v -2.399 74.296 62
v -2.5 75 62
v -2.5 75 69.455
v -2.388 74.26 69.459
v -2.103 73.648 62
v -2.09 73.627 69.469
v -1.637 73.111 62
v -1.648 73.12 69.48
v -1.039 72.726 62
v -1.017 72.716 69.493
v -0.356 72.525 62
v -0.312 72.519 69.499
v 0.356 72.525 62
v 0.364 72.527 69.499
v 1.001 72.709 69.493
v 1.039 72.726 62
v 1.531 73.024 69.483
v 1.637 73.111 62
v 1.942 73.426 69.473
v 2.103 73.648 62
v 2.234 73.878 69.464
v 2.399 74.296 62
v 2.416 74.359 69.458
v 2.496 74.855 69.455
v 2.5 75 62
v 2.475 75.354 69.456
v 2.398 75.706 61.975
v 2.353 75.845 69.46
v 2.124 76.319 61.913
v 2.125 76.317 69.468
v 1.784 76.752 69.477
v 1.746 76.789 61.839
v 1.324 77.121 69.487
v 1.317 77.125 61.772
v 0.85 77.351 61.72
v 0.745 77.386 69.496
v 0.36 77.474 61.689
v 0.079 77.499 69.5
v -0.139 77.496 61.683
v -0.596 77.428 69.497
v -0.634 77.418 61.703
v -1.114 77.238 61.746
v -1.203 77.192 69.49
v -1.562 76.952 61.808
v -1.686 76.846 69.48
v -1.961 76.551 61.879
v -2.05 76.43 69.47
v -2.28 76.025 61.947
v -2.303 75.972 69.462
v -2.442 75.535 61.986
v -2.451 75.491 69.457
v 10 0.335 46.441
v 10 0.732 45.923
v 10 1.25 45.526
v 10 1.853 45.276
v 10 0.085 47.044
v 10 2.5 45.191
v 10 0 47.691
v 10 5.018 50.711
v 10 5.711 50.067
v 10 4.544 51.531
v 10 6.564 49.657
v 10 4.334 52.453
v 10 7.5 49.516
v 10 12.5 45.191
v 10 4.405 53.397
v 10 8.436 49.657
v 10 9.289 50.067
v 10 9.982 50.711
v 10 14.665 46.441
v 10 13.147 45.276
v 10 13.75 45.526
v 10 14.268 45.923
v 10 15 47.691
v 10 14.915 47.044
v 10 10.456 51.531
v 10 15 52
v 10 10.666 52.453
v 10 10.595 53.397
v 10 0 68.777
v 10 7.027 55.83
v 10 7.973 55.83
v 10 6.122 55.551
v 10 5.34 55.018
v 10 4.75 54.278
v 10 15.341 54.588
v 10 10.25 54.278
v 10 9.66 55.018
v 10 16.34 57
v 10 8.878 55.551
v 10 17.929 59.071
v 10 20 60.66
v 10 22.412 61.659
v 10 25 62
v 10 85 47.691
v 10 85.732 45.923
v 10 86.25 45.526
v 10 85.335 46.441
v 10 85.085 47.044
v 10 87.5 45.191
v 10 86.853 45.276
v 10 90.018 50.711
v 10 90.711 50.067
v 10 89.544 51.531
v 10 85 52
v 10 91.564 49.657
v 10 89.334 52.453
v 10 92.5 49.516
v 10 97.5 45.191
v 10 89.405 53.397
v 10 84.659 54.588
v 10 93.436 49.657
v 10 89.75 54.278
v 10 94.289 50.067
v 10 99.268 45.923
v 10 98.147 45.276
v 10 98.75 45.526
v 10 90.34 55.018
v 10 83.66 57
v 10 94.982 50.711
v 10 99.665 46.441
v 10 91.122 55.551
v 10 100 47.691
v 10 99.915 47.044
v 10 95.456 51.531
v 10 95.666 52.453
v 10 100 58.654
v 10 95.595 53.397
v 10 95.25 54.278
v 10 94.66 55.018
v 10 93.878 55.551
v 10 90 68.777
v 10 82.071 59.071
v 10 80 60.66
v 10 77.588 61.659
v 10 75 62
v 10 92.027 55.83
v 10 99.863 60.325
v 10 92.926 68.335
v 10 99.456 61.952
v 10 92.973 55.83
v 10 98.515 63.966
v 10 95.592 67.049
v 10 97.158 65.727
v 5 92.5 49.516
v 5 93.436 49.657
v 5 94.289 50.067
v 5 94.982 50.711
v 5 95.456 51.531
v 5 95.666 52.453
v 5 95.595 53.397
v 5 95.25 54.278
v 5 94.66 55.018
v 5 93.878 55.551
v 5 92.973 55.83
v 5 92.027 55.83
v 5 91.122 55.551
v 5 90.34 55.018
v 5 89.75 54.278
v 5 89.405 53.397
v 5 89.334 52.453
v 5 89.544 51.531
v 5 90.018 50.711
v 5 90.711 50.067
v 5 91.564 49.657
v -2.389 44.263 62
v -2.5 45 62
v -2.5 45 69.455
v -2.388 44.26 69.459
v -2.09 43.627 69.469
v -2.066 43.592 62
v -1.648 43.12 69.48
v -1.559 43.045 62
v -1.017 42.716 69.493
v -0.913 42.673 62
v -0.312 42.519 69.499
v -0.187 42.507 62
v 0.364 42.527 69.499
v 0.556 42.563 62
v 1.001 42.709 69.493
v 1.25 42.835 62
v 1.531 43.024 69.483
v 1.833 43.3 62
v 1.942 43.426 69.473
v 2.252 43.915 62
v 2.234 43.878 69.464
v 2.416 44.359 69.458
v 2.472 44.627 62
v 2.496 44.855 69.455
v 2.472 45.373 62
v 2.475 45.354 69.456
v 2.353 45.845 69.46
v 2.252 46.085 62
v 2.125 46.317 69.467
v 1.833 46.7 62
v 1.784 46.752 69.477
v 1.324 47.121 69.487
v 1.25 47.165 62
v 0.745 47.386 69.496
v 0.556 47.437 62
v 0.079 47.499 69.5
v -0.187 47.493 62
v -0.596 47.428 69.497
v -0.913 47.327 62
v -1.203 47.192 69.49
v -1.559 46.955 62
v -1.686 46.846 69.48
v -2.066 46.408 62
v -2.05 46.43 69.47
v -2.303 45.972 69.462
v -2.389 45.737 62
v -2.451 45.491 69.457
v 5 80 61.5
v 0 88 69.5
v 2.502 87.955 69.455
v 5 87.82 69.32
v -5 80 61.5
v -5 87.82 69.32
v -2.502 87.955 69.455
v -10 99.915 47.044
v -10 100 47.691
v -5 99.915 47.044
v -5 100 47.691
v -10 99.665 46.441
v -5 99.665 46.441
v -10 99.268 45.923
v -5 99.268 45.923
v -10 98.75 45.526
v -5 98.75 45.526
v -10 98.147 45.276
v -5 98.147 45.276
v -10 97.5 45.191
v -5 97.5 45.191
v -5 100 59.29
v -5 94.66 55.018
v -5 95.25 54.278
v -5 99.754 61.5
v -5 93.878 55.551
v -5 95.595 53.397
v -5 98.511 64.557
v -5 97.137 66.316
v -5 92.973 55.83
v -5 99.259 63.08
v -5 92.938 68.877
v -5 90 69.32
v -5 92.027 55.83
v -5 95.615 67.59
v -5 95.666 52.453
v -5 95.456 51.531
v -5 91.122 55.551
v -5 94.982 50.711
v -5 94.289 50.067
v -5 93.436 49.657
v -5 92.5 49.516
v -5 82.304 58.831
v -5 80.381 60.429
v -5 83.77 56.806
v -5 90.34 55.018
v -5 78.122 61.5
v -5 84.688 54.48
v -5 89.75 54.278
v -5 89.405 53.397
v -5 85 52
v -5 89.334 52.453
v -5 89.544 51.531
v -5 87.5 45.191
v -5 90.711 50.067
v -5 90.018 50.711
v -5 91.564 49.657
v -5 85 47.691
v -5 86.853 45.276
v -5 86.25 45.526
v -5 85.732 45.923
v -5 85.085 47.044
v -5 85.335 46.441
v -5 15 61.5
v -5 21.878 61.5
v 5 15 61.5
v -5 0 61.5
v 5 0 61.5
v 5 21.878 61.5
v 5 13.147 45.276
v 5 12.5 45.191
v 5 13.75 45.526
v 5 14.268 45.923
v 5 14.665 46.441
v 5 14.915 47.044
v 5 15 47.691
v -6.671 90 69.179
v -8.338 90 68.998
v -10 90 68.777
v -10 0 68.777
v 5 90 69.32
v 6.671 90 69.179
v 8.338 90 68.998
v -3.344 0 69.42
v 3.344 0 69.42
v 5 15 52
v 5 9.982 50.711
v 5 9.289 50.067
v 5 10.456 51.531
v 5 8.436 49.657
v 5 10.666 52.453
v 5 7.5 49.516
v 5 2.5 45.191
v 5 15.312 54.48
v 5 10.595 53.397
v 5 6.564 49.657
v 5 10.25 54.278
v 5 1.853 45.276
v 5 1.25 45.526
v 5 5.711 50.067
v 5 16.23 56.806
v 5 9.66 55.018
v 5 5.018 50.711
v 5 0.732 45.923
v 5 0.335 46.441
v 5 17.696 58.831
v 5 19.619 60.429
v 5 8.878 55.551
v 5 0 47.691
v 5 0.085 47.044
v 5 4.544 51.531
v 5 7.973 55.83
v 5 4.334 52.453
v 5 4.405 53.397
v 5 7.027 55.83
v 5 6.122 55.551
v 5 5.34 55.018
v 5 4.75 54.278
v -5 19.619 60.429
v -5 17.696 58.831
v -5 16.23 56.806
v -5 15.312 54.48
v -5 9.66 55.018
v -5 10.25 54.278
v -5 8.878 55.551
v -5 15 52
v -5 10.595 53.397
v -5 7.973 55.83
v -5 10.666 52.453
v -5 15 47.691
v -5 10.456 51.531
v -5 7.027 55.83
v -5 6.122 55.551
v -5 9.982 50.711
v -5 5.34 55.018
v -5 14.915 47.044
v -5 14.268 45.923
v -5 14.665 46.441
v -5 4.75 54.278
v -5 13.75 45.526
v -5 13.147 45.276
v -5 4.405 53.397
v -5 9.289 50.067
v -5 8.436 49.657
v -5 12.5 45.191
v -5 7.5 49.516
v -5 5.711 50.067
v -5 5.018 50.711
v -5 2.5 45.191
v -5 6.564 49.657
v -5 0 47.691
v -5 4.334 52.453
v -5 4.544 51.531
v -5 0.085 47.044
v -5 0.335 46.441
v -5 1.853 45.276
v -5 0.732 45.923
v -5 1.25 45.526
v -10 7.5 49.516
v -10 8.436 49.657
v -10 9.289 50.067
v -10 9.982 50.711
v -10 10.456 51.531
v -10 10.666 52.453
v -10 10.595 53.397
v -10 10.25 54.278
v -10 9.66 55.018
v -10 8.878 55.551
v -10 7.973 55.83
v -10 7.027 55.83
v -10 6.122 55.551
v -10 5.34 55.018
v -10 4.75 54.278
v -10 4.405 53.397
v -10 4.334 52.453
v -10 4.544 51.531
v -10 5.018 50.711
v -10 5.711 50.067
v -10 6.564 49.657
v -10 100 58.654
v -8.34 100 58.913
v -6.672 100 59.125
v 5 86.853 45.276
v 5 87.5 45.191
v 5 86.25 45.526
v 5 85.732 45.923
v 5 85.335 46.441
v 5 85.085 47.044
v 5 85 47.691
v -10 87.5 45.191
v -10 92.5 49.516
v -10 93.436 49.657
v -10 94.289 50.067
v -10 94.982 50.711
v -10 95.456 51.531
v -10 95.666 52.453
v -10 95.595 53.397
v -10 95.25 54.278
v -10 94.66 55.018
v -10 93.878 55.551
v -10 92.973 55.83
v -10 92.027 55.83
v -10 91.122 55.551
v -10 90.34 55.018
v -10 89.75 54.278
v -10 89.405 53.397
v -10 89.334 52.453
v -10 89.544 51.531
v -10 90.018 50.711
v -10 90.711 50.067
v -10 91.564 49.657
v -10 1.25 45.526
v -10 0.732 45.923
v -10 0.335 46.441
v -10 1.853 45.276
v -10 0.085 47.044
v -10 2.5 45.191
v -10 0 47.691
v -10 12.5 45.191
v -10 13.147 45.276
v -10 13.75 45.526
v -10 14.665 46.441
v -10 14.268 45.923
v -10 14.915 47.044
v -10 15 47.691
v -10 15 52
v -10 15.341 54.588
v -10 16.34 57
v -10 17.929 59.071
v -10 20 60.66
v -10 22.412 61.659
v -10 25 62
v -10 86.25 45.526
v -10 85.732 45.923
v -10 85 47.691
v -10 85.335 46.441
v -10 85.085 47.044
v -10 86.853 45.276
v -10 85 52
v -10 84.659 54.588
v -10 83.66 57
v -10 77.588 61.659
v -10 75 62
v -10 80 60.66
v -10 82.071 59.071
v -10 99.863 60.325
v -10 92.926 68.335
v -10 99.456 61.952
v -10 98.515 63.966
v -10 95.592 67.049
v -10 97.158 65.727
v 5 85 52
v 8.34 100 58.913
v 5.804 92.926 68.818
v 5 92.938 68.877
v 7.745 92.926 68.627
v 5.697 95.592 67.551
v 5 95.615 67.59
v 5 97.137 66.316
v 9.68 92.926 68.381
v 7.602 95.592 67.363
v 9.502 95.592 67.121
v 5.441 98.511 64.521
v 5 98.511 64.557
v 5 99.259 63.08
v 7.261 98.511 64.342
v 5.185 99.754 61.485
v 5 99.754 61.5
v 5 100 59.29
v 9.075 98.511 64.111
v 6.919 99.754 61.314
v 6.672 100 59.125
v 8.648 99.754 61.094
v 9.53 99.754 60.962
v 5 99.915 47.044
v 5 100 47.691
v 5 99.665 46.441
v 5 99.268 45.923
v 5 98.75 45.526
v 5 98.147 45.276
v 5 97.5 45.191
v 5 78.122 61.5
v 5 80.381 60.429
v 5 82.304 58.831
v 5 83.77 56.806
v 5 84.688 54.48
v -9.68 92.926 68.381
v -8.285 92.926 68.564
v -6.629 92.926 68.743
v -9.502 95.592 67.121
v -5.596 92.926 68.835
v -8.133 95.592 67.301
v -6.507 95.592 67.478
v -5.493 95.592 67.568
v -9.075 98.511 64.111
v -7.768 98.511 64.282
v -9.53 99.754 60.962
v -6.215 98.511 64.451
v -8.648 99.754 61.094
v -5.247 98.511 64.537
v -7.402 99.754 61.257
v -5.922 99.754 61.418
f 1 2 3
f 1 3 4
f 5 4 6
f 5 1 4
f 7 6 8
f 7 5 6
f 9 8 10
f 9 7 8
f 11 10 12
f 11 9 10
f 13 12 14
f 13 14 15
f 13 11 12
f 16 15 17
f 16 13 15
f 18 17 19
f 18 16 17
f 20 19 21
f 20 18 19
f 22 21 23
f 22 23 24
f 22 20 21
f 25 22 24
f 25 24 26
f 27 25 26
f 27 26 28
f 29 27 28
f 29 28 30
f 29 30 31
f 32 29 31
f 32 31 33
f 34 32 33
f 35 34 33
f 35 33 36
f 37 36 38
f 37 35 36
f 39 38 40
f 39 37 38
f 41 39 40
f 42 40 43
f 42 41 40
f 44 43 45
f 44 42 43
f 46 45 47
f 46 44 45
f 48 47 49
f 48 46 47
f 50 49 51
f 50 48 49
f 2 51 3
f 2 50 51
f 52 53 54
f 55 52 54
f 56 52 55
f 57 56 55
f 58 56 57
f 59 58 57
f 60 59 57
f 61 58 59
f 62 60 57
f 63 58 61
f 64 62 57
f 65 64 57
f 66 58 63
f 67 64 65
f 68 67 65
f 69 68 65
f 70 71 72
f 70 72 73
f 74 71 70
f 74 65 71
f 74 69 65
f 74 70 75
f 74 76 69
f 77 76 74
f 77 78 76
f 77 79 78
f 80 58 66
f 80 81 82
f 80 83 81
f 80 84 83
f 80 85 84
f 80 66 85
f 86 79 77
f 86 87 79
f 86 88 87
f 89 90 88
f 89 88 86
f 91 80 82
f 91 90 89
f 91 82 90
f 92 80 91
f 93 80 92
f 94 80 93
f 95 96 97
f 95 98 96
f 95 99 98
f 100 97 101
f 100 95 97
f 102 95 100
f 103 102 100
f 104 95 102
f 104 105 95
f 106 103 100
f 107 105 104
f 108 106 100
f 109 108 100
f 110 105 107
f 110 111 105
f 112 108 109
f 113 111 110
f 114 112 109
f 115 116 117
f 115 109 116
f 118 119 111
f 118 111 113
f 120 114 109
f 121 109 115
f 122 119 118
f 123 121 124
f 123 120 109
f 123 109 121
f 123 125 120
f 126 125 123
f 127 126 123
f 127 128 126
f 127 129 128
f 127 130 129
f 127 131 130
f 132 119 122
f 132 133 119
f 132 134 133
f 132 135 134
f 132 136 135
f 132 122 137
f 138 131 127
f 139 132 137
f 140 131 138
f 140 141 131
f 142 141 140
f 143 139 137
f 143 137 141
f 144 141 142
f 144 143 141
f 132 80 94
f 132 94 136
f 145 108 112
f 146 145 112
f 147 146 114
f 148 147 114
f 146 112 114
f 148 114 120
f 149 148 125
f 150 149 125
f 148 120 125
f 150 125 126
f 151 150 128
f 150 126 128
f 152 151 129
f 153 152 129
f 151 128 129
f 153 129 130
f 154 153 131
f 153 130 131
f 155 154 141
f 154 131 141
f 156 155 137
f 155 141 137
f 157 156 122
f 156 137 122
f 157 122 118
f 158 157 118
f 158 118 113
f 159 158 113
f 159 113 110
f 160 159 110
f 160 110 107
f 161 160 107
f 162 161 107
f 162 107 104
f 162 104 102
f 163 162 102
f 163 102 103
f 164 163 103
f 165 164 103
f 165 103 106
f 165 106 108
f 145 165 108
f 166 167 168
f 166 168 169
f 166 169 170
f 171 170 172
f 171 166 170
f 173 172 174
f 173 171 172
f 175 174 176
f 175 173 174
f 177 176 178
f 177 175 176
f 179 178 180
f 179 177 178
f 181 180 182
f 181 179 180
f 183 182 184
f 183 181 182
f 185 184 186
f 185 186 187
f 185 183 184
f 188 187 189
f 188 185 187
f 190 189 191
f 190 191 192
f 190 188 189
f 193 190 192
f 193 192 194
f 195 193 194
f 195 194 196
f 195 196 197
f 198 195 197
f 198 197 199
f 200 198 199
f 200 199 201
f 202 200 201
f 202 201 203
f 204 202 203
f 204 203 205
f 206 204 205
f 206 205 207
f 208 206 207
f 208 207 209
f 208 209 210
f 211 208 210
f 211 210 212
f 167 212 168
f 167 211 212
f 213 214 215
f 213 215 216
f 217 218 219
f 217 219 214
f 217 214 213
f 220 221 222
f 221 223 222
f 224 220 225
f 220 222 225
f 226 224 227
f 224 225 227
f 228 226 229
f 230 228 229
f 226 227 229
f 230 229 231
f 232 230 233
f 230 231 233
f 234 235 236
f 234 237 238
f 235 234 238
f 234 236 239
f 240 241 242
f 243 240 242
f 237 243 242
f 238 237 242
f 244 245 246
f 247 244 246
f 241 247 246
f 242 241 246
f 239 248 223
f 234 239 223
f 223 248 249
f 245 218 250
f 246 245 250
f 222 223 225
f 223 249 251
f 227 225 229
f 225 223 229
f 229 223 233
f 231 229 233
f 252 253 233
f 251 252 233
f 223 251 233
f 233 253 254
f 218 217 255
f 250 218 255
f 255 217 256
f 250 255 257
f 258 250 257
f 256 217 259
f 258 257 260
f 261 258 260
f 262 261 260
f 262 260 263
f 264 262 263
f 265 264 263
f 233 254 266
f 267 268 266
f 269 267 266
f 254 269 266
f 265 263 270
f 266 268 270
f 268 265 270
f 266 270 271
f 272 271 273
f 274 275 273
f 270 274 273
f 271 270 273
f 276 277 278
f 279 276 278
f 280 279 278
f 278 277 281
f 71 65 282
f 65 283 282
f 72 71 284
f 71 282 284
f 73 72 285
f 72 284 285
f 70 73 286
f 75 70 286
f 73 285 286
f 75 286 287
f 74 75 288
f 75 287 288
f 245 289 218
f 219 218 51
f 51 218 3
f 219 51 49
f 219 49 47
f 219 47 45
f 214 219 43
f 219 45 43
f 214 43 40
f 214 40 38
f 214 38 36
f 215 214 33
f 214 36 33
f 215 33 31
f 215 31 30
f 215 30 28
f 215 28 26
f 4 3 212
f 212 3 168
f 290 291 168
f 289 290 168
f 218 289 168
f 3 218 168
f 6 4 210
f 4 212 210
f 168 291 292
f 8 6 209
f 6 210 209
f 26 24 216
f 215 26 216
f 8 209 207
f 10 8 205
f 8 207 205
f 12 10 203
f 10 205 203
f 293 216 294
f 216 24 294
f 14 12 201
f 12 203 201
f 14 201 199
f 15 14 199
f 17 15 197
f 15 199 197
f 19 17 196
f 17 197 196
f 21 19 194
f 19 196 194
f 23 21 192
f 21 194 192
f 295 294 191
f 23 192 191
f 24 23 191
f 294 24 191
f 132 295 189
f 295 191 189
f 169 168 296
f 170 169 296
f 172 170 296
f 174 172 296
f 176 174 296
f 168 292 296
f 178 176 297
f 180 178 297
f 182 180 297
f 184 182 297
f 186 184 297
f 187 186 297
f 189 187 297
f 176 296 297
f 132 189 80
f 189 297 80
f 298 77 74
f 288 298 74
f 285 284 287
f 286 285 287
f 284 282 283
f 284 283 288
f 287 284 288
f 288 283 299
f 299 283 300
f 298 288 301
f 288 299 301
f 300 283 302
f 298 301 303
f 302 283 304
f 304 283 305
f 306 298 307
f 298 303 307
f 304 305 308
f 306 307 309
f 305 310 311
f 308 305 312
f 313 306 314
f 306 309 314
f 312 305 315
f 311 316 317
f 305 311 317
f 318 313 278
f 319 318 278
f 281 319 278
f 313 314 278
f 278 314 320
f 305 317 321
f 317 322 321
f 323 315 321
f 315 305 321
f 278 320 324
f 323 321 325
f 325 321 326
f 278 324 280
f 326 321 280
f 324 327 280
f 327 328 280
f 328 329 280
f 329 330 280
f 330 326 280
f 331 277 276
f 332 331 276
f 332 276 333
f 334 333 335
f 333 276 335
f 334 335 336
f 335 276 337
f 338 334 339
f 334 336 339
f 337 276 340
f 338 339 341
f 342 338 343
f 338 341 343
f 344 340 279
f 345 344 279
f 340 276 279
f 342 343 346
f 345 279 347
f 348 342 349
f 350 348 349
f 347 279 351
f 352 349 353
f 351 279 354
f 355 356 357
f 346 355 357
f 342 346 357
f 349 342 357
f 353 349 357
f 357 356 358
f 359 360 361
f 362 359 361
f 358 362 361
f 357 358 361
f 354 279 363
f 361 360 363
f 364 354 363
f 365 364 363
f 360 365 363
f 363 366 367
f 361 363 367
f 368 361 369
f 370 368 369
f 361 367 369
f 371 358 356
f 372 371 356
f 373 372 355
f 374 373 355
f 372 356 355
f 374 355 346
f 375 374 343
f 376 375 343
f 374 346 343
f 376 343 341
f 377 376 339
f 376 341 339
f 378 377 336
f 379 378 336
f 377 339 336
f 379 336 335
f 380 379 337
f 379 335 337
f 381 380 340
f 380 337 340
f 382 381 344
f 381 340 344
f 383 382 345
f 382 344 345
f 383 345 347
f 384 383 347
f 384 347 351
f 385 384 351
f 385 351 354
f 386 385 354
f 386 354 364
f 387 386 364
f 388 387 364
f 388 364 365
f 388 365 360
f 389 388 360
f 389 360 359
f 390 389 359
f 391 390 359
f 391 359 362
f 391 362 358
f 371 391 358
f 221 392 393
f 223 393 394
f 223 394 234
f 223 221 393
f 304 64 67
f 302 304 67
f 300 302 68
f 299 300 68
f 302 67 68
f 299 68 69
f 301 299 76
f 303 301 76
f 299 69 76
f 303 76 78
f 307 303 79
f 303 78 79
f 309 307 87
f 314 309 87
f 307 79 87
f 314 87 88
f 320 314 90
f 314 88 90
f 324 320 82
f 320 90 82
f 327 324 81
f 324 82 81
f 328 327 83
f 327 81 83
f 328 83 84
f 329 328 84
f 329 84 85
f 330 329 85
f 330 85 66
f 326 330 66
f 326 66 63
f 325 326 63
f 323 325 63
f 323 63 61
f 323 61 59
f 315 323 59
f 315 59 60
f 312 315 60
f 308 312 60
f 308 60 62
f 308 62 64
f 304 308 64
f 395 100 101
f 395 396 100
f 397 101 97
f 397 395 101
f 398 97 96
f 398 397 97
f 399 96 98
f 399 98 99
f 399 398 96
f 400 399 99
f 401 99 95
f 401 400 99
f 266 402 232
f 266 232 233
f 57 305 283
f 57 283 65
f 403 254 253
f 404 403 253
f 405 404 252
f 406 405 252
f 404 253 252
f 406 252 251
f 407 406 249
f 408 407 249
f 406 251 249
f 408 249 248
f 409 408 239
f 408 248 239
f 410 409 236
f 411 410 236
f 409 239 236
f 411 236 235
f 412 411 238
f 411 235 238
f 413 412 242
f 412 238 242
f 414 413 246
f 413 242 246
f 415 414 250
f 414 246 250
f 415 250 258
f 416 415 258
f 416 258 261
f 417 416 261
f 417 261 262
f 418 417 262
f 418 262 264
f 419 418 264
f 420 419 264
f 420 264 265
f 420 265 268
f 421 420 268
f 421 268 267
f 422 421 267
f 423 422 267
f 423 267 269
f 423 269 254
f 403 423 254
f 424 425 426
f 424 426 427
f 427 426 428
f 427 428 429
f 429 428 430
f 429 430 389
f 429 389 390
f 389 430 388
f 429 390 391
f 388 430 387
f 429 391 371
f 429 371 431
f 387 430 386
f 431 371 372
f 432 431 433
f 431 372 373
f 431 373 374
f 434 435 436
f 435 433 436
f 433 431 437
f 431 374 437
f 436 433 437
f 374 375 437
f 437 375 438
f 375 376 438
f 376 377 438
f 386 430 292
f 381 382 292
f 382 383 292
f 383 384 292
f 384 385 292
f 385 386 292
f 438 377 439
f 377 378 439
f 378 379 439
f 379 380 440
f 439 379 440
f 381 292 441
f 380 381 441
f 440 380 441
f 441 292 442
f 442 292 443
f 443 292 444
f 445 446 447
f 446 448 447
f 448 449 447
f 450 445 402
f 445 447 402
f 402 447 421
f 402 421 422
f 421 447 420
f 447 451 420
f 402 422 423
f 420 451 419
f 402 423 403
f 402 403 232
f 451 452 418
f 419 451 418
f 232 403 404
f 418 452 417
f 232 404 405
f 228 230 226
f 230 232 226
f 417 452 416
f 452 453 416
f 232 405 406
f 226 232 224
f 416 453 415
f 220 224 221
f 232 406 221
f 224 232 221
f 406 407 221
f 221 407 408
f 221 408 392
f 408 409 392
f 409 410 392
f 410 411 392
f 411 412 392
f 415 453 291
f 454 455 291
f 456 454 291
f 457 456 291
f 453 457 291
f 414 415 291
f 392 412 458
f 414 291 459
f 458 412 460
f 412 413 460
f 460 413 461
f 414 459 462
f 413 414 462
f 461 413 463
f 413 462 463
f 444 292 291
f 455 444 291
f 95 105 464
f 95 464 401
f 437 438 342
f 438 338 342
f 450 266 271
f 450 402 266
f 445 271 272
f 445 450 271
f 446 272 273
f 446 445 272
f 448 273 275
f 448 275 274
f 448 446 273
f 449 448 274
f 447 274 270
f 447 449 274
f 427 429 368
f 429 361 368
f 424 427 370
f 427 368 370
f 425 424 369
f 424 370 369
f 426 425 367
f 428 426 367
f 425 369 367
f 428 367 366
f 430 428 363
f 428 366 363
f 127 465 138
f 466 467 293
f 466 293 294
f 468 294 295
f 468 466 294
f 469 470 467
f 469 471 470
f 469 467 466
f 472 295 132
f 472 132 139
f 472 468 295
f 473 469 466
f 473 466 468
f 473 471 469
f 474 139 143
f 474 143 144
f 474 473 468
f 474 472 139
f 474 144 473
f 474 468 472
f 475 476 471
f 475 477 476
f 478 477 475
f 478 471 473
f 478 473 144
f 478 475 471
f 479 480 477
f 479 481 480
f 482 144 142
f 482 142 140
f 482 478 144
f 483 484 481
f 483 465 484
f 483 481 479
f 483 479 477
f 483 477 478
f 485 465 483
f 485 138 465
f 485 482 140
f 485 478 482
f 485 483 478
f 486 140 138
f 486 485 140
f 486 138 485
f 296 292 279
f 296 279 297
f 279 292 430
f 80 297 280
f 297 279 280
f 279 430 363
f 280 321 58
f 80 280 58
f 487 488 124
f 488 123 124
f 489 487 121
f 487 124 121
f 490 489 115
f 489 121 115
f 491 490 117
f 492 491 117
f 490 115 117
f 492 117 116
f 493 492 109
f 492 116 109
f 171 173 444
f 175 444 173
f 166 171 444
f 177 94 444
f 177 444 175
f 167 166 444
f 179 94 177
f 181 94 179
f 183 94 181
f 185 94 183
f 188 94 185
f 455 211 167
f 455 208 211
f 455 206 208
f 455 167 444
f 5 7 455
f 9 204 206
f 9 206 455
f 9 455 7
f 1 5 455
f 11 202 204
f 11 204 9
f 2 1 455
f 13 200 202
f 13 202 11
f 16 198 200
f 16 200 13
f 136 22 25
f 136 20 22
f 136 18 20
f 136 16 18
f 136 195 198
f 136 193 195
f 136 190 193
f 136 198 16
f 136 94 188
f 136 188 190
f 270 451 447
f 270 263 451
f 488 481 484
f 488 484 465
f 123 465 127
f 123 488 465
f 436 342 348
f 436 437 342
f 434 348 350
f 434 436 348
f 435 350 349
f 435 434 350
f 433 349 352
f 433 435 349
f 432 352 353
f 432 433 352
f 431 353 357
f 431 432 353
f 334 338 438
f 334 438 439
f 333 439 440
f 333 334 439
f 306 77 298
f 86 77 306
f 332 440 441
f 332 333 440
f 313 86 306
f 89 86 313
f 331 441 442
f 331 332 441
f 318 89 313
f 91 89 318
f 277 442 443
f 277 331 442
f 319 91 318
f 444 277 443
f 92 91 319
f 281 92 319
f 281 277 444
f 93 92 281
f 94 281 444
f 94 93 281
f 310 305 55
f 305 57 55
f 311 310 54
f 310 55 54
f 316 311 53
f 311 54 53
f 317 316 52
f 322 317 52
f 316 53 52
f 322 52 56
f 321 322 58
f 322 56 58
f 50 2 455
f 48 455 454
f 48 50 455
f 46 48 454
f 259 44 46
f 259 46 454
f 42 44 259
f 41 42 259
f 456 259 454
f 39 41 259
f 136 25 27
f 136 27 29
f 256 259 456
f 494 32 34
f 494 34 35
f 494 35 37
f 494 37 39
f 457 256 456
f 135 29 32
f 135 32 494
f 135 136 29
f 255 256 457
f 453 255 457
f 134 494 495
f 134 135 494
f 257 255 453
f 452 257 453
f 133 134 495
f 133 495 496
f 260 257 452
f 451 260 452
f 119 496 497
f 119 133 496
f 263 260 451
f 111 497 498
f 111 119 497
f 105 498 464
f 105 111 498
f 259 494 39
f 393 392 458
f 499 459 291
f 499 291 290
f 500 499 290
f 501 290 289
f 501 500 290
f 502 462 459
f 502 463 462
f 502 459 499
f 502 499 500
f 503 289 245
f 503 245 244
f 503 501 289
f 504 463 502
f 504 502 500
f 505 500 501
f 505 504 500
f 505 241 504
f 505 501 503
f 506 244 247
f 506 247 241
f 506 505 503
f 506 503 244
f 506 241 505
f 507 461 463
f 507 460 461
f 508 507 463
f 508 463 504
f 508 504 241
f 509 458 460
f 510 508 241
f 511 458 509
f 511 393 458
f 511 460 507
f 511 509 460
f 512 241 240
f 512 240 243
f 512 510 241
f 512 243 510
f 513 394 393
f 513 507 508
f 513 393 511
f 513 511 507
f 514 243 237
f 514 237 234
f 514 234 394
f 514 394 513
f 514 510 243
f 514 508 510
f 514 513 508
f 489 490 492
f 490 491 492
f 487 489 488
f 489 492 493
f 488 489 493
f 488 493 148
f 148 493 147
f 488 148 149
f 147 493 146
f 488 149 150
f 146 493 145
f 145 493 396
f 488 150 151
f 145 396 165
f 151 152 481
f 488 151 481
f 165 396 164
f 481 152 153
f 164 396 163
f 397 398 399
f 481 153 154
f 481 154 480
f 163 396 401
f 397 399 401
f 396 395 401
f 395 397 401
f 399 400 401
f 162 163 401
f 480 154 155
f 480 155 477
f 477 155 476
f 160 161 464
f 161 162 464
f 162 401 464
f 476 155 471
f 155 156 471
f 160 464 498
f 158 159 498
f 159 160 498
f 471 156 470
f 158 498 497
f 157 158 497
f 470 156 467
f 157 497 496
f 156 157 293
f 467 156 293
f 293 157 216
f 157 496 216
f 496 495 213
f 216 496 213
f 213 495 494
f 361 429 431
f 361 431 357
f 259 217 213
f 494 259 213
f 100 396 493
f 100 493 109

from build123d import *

# Parameters (mm, degrees)
SKETCH1_W               = 5
SKETCH1_H               = 5.034727375
SKETCH1_H_2             = 16.309288723
BOSS_EXTRUDE10_DEPTH    = 100
SKETCH17_W              = 16.809288723
SKETCH17_H              = 70
CUT_EXTRUDE1_DEPTH      = 25
FILLET1_R               = 10
FILLET2_R               = 2.5
FILLET3_R               = 10
SKETCH17_3_R            = 3.175
CUT_EXTRUDE2_DEPTH      = 25
CUT_EXTRUDE3_START      = -7.276812953
CUT_EXTRUDE3_OUTLINE_W  = 10
CUT_EXTRUDE3_OUTLINE_H  = 10
CUT_EXTRUDE3_DEPTH      = 8
CHAMFER1_SIZE           = 10
CUT_EXTRUDE4_DEPTH      = 104.229376725
CUT_EXTRUDE4_DEPTH_BACK = 20
SKETCH20_R              = 2.5


# Read off the part's stored shape, not the designer's step: Cut-Extrude3
with BuildPart() as part:
    # Sketch1 → Boss-Extrude10 (new body)
    with BuildSketch(Plane(origin=(0, 0, 0), x_dir=(1, 0, 0), z_dir=(0, 1, 0))):
        with BuildLine():
            Line((-5, -66.534727375), (-10, -66.534727375))
            Line((-10, -66.534727375), (-10, -66.755149614))
            ThreePointArc((-10, -66.755149614), (-7.505213856, -67.081456193), (-5, -67.314560089))
            Line((-5, -67.314560089), (-5, -66.534727375))
        make_face()
        with BuildLine():
            ThreePointArc((-5, -67.314560089), (-7.505213856, -67.081456193), (-10, -66.755149614))
            Line((-10, -66.755149614), (-10, -68.018839302))
            ThreePointArc((-10, -68.018839302), (-7.505023524, -68.339133166), (-5, -68.56794076))
            Line((-5, -68.56794076), (-5, -67.314560089))
        make_face()
        with BuildLine():
            ThreePointArc((10, -66.755149614), (7.505213856, -67.081456193), (5, -67.314560089))
            Line((5, -67.314560089), (5, -68.56794076))
            ThreePointArc((5, -68.56794076), (7.505023524, -68.339133166), (10, -68.018839302))
            Line((10, -68.018839302), (10, -66.755149614))
        make_face()
        with BuildLine():
            Line((5, -66.534727375), (5, -67.314560089))
            ThreePointArc((5, -67.314560089), (7.505213856, -67.081456193), (10, -66.755149614))
            Line((10, -66.755149614), (10, -66.534727375))
            Line((10, -66.534727375), (5, -66.534727375))
        make_face()
        with BuildLine():
            Line((0, -66.534727375), (-5, -66.534727375))
            Line((-5, -66.534727375), (-5, -67.314560089))
            ThreePointArc((-5, -67.314560089), (0, -67.5), (5, -67.314560089))
            Line((5, -67.314560089), (5, -66.534727375))
            Line((5, -66.534727375), (0, -66.534727375))
        make_face()
        with BuildLine():
            ThreePointArc((5, -67.314560089), (0, -67.5), (-5, -67.314560089))
            Line((-5, -67.314560089), (-5, -68.56794076))
            ThreePointArc((-5, -68.56794076), (0, -68.75), (5, -68.56794076))
            Line((5, -68.56794076), (5, -67.314560089))
        make_face()
        with Locations((7.5, -64.017363688)):
            Rectangle(SKETCH1_W, SKETCH1_H)
        with Locations((-7.5, -64.017363688)):
            Rectangle(SKETCH1_W, SKETCH1_H)
        Polygon((-5, -61.5), (-5, -66.534727375), (0, -66.534727375), (5, -66.534727375), (5, -61.5), align=None)
        with Locations((-7.5, -53.345355639)):
            Rectangle(SKETCH1_W, SKETCH1_H_2)
        with Locations((7.5, -53.345355639)):
            Rectangle(SKETCH1_W, SKETCH1_H_2)
        with BuildLine():
            ThreePointArc((-5, -68.56794076), (-7.505023524, -68.339133166), (-10, -68.018839302))
            Line((-10, -68.018839302), (-10, -68.776812953))
            ThreePointArc((-10, -68.776812953), (0, -69.5), (10, -68.776812953))
            Line((10, -68.776812953), (10, -68.018839302))
            ThreePointArc((10, -68.018839302), (7.505023524, -68.339133166), (5, -68.56794076))
            ThreePointArc((5, -68.56794076), (0, -68.75), (-5, -68.56794076))
        make_face()
    extrude(amount=BOSS_EXTRUDE10_DEPTH)

    # Sketch17 → Cut-Extrude1 (cut)
    with BuildSketch(Plane(origin=(10, 0, 0), x_dir=(0, 0, -1), z_dir=(1, 0, 0))):
        with Locations((-53.595355639, 50)):
            Rectangle(SKETCH17_W, SKETCH17_H)
    extrude(amount=-CUT_EXTRUDE1_DEPTH, mode=Mode.SUBTRACT)

    # Fillet1
    # the kernel refuses this fillet: 10 mm, written as the material it adds along each edge
    with BuildSketch(Plane(origin=(10, 15, 62), x_dir=(0, 0, -1), z_dir=(-1, 0, 0))) as fillet1_piece_1_section:
        with BuildLine():
            CenterArc((FILLET1_R, -FILLET1_R), FILLET1_R, 90, 90)
            Line((0, -FILLET1_R), (0, 0))
            Line((0, 0), (FILLET1_R, 0))
        make_face()
    fillet1_piece_1 = extrude(amount=20, mode=Mode.PRIVATE)
    fillet1_piece_1 = split(fillet1_piece_1, bisect_by=Plane(origin=(5, 16.64778747, 59.064177201), z_dir=(1, 0, 0)), keep=Keep.TOP, mode=Mode.PRIVATE)
    fillet1_piece_1 = split(fillet1_piece_1, bisect_by=Plane(origin=(7.5, 16.64778747, 61.5), z_dir=(0, 0, -1)), keep=Keep.TOP, mode=Mode.PRIVATE)
    add(fillet1_piece_1)
    with BuildSketch(Plane(origin=(10, 15, 62), x_dir=(0, 0, -1), z_dir=(-1, 0, 0))) as fillet1_piece_2_section:
        with BuildLine():
            CenterArc((FILLET1_R, -FILLET1_R), FILLET1_R, 90, 90)
            Line((0, -FILLET1_R), (0, 0))
            Line((0, 0), (FILLET1_R, 0))
        make_face()
    fillet1_piece_2 = extrude(amount=20, mode=Mode.PRIVATE)
    fillet1_piece_2 = split(fillet1_piece_2, bisect_by=Plane(origin=(5, 19.226172228, 61.875676343), z_dir=(1, 0, 0)), keep=Keep.TOP, mode=Mode.PRIVATE)
    fillet1_piece_2 = split(fillet1_piece_2, bisect_by=Plane(origin=(7.5, 19.226172228, 61.5), z_dir=(0, 0, 1)), keep=Keep.TOP, mode=Mode.PRIVATE)
    add(fillet1_piece_2)
    with BuildSketch(Plane(origin=(10, 15, 62), x_dir=(0, 0, -1), z_dir=(-1, 0, 0))) as fillet1_piece_3_section:
        with BuildLine():
            CenterArc((FILLET1_R, -FILLET1_R), FILLET1_R, 90, 90)
            Line((0, -FILLET1_R), (0, 0))
            Line((0, 0), (FILLET1_R, 0))
        make_face()
    fillet1_piece_3 = extrude(amount=20, mode=Mode.PRIVATE)
    fillet1_piece_3 = split(fillet1_piece_3, bisect_by=Plane(origin=(5, 19.226172228, 61.875676343), z_dir=(-1, 0, 0)), keep=Keep.TOP, mode=Mode.PRIVATE)
    fillet1_piece_3 = split(fillet1_piece_3, bisect_by=Plane(origin=(0, 19.226172228, 61.5), z_dir=(0, 0, 1)), keep=Keep.TOP, mode=Mode.PRIVATE)
    fillet1_piece_3 = split(fillet1_piece_3, bisect_by=Plane(origin=(-5, 19.226172228, 61.875676343), z_dir=(1, 0, 0)), keep=Keep.TOP, mode=Mode.PRIVATE)
    add(fillet1_piece_3)
    with BuildSketch(Plane(origin=(10, 15, 62), x_dir=(0, 0, -1), z_dir=(-1, 0, 0))) as fillet1_piece_4_section:
        with BuildLine():
            CenterArc((FILLET1_R, -FILLET1_R), FILLET1_R, 90, 90)
            Line((0, -FILLET1_R), (0, 0))
            Line((0, 0), (FILLET1_R, 0))
        make_face()
    fillet1_piece_4 = extrude(amount=20, mode=Mode.PRIVATE)
    fillet1_piece_4 = split(fillet1_piece_4, bisect_by=Plane(origin=(-7.5, 16.64778747, 61.5), z_dir=(0, 0, -1)), keep=Keep.TOP, mode=Mode.PRIVATE)
    fillet1_piece_4 = split(fillet1_piece_4, bisect_by=Plane(origin=(-5, 16.64778747, 59.064177201), z_dir=(-1, 0, 0)), keep=Keep.TOP, mode=Mode.PRIVATE)
    add(fillet1_piece_4)
    with BuildSketch(Plane(origin=(10, 15, 62), x_dir=(0, 0, -1), z_dir=(-1, 0, 0))) as fillet1_piece_5_section:
        with BuildLine():
            CenterArc((FILLET1_R, -FILLET1_R), FILLET1_R, 90, 90)
            Line((0, -FILLET1_R), (0, 0))
            Line((0, 0), (FILLET1_R, 0))
        make_face()
    fillet1_piece_5 = extrude(amount=20, mode=Mode.PRIVATE)
    fillet1_piece_5 = split(fillet1_piece_5, bisect_by=Plane(origin=(-7.5, 19.226172228, 61.5), z_dir=(0, 0, 1)), keep=Keep.TOP, mode=Mode.PRIVATE)
    fillet1_piece_5 = split(fillet1_piece_5, bisect_by=Plane(origin=(-5, 19.226172228, 61.875676343), z_dir=(-1, 0, 0)), keep=Keep.TOP, mode=Mode.PRIVATE)
    add(fillet1_piece_5)
    with BuildSketch(Plane(origin=(10, 85, 62), x_dir=(0, -1, 0), z_dir=(-1, 0, 0))) as fillet1_piece_6_section:
        with BuildLine():
            CenterArc((FILLET1_R, -FILLET1_R), FILLET1_R, 90, 90)
            Line((0, -FILLET1_R), (0, 0))
            Line((0, 0), (FILLET1_R, 0))
        make_face()
    fillet1_piece_6 = extrude(amount=20, mode=Mode.PRIVATE)
    fillet1_piece_6 = split(fillet1_piece_6, bisect_by=Plane(origin=(7.5, 80.773827772, 61.5), z_dir=(0, 0, 1)), keep=Keep.TOP, mode=Mode.PRIVATE)
    fillet1_piece_6 = split(fillet1_piece_6, bisect_by=Plane(origin=(5, 80.773827772, 61.875676343), z_dir=(1, 0, 0)), keep=Keep.TOP, mode=Mode.PRIVATE)
    add(fillet1_piece_6)
    with BuildSketch(Plane(origin=(10, 85, 62), x_dir=(0, -1, 0), z_dir=(-1, 0, 0))) as fillet1_piece_7_section:
        with BuildLine():
            CenterArc((FILLET1_R, -FILLET1_R), FILLET1_R, 90, 90)
            Line((0, -FILLET1_R), (0, 0))
            Line((0, 0), (FILLET1_R, 0))
        make_face()
    fillet1_piece_7 = extrude(amount=20, mode=Mode.PRIVATE)
    fillet1_piece_7 = split(fillet1_piece_7, bisect_by=Plane(origin=(7.5, 83.35221253, 61.5), z_dir=(0, 0, -1)), keep=Keep.TOP, mode=Mode.PRIVATE)
    fillet1_piece_7 = split(fillet1_piece_7, bisect_by=Plane(origin=(5, 83.35221253, 59.064177201), z_dir=(1, 0, 0)), keep=Keep.TOP, mode=Mode.PRIVATE)
    add(fillet1_piece_7)
    with BuildSketch(Plane(origin=(10, 85, 62), x_dir=(0, -1, 0), z_dir=(-1, 0, 0))) as fillet1_piece_8_section:
        with BuildLine():
            CenterArc((FILLET1_R, -FILLET1_R), FILLET1_R, 90, 90)
            Line((0, -FILLET1_R), (0, 0))
            Line((0, 0), (FILLET1_R, 0))
        make_face()
    fillet1_piece_8 = extrude(amount=20, mode=Mode.PRIVATE)
    fillet1_piece_8 = split(fillet1_piece_8, bisect_by=Plane(origin=(-5, 80.773827772, 61.875676343), z_dir=(1, 0, 0)), keep=Keep.TOP, mode=Mode.PRIVATE)
    fillet1_piece_8 = split(fillet1_piece_8, bisect_by=Plane(origin=(0, 80.773827772, 61.5), z_dir=(0, 0, 1)), keep=Keep.TOP, mode=Mode.PRIVATE)
    fillet1_piece_8 = split(fillet1_piece_8, bisect_by=Plane(origin=(5, 80.773827772, 61.875676343), z_dir=(-1, 0, 0)), keep=Keep.TOP, mode=Mode.PRIVATE)
    add(fillet1_piece_8)
    with BuildSketch(Plane(origin=(10, 85, 62), x_dir=(0, -1, 0), z_dir=(-1, 0, 0))) as fillet1_piece_9_section:
        with BuildLine():
            CenterArc((FILLET1_R, -FILLET1_R), FILLET1_R, 90, 90)
            Line((0, -FILLET1_R), (0, 0))
            Line((0, 0), (FILLET1_R, 0))
        make_face()
    fillet1_piece_9 = extrude(amount=20, mode=Mode.PRIVATE)
    fillet1_piece_9 = split(fillet1_piece_9, bisect_by=Plane(origin=(-5, 80.773827772, 61.875676343), z_dir=(-1, 0, 0)), keep=Keep.TOP, mode=Mode.PRIVATE)
    fillet1_piece_9 = split(fillet1_piece_9, bisect_by=Plane(origin=(-7.5, 80.773827772, 61.5), z_dir=(0, 0, 1)), keep=Keep.TOP, mode=Mode.PRIVATE)
    add(fillet1_piece_9)
    with BuildSketch(Plane(origin=(10, 85, 62), x_dir=(0, -1, 0), z_dir=(-1, 0, 0))) as fillet1_piece_10_section:
        with BuildLine():
            CenterArc((FILLET1_R, -FILLET1_R), FILLET1_R, 90, 90)
            Line((0, -FILLET1_R), (0, 0))
            Line((0, 0), (FILLET1_R, 0))
        make_face()
    fillet1_piece_10 = extrude(amount=20, mode=Mode.PRIVATE)
    fillet1_piece_10 = split(fillet1_piece_10, bisect_by=Plane(origin=(-5, 83.35221253, 59.064177201), z_dir=(-1, 0, 0)), keep=Keep.TOP, mode=Mode.PRIVATE)
    fillet1_piece_10 = split(fillet1_piece_10, bisect_by=Plane(origin=(-7.5, 83.35221253, 61.5), z_dir=(0, 0, -1)), keep=Keep.TOP, mode=Mode.PRIVATE)
    add(fillet1_piece_10)

    # Fillet2
    fillet2_edges = [part.edges().sort_by_distance(p)[0] for p in [
        (-7.5, 0, 45.190711277),
        (7.5, 0, 45.190711277),
        (7.5, 100, 45.190711277),
        (-7.5, 100, 45.190711277),
        (-7.5, 85, 45.190711277),
        (7.5, 85, 45.190711277),
        (7.5, 15, 45.190711277),
        (-7.5, 15, 45.190711277),
    ]]
    fillet(fillet2_edges, radius=FILLET2_R)

    # Fillet3
    # the kernel refuses this fillet: 10 mm, written as the material it takes off along each edge
    with BuildSketch(Plane(origin=(0, 100, 0), x_dir=(-0.4830223536282857, 0, 0.8756080206892758), z_dir=(-0.8756080206892758, 0, -0.4830223536282857))) as fillet3_piece_1:
        with BuildLine():
            CenterArc((69.5 - FILLET3_R, -FILLET3_R), FILLET3_R, 0, 90)
            Line((69.5, -FILLET3_R), (69.5, 0))
            Line((69.5, 0), (69.5 - FILLET3_R, 0))
        make_face()
    revolve(axis=Axis((0, 100, 0), (0, 1, 0)), revolution_arc=57.765966915, mode=Mode.SUBTRACT)

    # Sketch17<3> → Cut-Extrude2 (cut)
    with BuildSketch(Plane(origin=(10, 0, 0), x_dir=(0, 0, -1), z_dir=(1, 0, 0))):
        with Locations((-52.690711277, 92.5)):
            Circle(SKETCH17_3_R)
        with Locations((-52.690711277, 7.5)):
            Circle(SKETCH17_3_R)
    extrude(amount=-CUT_EXTRUDE2_DEPTH, mode=Mode.SUBTRACT)

    # Cut-Extrude3 outline → Cut-Extrude3 (cut)
    with BuildSketch(Plane.XY.offset(68.776812953).offset(CUT_EXTRUDE3_START)):
        with Locations((0, 95)):
            Rectangle(CUT_EXTRUDE3_OUTLINE_W, CUT_EXTRUDE3_OUTLINE_H)
    extrude(amount=CUT_EXTRUDE3_DEPTH, mode=Mode.SUBTRACT)

    # Chamfer1
    # the kernel refuses this chamfer: 10 mm, written as the material it takes off along each edge
    with BuildSketch(Plane(origin=(-5, 90, 61.5), x_dir=(0, 0.02749587661029838, 0.9996219169113046), z_dir=(1, 0, 0))) as chamfer1_piece_1:
        Polygon((CHAMFER1_SIZE * 0.999621916911, CHAMFER1_SIZE * 0.0274958766103), (-CHAMFER1_SIZE * 0.0274958766307, CHAMFER1_SIZE * 0.999621916911), (0, 0), align=None)
    extrude(amount=10, mode=Mode.SUBTRACT)

    # Sketch20 → Cut-Extrude4 (cut, two sides: drawn at the far end of the back side and taken through both)
    with BuildSketch(Plane.XY.offset(68.776812953).offset(-CUT_EXTRUDE4_DEPTH_BACK)):
        with Locations(Location((0, 75, 0), (0, 0, 180))):
            Circle(SKETCH20_R)
        with Locations(Location((0, 45, 0), (0, 0, 180))):
            Circle(SKETCH20_R)
    extrude(amount=CUT_EXTRUDE4_DEPTH + CUT_EXTRUDE4_DEPTH_BACK, mode=Mode.SUBTRACT)


solid = part.part
